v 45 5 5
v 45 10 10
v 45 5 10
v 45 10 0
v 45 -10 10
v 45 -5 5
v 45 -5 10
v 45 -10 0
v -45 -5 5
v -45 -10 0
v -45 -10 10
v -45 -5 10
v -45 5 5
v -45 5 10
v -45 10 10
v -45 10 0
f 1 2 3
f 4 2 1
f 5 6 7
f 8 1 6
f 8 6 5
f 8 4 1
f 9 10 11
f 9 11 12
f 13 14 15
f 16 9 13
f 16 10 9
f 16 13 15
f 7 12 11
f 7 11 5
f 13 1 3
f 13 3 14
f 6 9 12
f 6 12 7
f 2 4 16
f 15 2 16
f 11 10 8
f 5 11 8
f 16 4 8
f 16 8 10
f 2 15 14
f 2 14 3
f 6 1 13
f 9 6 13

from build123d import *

# Parameters (mm, degrees)
BOSS_EXTRUDE1_DEPTH = 10
CUT_EXTRUDE2_DEPTH  = 22
BOSS_EXTRUDE2_DEPTH = 5


with BuildPart() as part:
    # Sketch1 → Boss-Extrude1 (new body)
    with BuildSketch(Plane.XY):
        Polygon((45, 0), (45, 10), (-45, 10), (-45, 0), (-45, -10), (45, -10), align=None)
    extrude(amount=BOSS_EXTRUDE1_DEPTH)

    # Sketch2 → Cut-Extrude2 (cut)
    with BuildSketch(Plane.XY):
        Polygon((0, 5), (45, 5), (45, -5), (0, -5), (-45, -5), (-45, 5), align=None)
    extrude(amount=CUT_EXTRUDE2_DEPTH, mode=Mode.SUBTRACT)


with BuildPart() as cut_extrude2_piece_1:
    # of the separate pieces the step leaves, piece 1, a body of its own (cut_extrude2_pieces)
    add(part.part.solids().sort_by_distance((45, -5, 0))[0])



with BuildPart() as cut_extrude2_piece_2:
    # of the separate pieces the step leaves, piece 2, a body of its own (cut_extrude2_pieces)
    add(part.part.solids().sort_by_distance((45, 10, 0))[0])


with BuildPart() as cut_extrude2_piece_1_1:
    add(cut_extrude2_piece_1.part)

    add(cut_extrude2_piece_2.part)  # Boss-Extrude2 merges Cut-Extrude2 piece 2
    # Sketch2<3> → Boss-Extrude2 (add)
    with BuildSketch(Plane.XY):
        Polygon((0, 5), (45, 5), (45, -5), (0, -5), (-45, -5), (-45, 5), align=None)
    extrude(amount=BOSS_EXTRUDE2_DEPTH)


solid = cut_extrude2_piece_1_1.part
